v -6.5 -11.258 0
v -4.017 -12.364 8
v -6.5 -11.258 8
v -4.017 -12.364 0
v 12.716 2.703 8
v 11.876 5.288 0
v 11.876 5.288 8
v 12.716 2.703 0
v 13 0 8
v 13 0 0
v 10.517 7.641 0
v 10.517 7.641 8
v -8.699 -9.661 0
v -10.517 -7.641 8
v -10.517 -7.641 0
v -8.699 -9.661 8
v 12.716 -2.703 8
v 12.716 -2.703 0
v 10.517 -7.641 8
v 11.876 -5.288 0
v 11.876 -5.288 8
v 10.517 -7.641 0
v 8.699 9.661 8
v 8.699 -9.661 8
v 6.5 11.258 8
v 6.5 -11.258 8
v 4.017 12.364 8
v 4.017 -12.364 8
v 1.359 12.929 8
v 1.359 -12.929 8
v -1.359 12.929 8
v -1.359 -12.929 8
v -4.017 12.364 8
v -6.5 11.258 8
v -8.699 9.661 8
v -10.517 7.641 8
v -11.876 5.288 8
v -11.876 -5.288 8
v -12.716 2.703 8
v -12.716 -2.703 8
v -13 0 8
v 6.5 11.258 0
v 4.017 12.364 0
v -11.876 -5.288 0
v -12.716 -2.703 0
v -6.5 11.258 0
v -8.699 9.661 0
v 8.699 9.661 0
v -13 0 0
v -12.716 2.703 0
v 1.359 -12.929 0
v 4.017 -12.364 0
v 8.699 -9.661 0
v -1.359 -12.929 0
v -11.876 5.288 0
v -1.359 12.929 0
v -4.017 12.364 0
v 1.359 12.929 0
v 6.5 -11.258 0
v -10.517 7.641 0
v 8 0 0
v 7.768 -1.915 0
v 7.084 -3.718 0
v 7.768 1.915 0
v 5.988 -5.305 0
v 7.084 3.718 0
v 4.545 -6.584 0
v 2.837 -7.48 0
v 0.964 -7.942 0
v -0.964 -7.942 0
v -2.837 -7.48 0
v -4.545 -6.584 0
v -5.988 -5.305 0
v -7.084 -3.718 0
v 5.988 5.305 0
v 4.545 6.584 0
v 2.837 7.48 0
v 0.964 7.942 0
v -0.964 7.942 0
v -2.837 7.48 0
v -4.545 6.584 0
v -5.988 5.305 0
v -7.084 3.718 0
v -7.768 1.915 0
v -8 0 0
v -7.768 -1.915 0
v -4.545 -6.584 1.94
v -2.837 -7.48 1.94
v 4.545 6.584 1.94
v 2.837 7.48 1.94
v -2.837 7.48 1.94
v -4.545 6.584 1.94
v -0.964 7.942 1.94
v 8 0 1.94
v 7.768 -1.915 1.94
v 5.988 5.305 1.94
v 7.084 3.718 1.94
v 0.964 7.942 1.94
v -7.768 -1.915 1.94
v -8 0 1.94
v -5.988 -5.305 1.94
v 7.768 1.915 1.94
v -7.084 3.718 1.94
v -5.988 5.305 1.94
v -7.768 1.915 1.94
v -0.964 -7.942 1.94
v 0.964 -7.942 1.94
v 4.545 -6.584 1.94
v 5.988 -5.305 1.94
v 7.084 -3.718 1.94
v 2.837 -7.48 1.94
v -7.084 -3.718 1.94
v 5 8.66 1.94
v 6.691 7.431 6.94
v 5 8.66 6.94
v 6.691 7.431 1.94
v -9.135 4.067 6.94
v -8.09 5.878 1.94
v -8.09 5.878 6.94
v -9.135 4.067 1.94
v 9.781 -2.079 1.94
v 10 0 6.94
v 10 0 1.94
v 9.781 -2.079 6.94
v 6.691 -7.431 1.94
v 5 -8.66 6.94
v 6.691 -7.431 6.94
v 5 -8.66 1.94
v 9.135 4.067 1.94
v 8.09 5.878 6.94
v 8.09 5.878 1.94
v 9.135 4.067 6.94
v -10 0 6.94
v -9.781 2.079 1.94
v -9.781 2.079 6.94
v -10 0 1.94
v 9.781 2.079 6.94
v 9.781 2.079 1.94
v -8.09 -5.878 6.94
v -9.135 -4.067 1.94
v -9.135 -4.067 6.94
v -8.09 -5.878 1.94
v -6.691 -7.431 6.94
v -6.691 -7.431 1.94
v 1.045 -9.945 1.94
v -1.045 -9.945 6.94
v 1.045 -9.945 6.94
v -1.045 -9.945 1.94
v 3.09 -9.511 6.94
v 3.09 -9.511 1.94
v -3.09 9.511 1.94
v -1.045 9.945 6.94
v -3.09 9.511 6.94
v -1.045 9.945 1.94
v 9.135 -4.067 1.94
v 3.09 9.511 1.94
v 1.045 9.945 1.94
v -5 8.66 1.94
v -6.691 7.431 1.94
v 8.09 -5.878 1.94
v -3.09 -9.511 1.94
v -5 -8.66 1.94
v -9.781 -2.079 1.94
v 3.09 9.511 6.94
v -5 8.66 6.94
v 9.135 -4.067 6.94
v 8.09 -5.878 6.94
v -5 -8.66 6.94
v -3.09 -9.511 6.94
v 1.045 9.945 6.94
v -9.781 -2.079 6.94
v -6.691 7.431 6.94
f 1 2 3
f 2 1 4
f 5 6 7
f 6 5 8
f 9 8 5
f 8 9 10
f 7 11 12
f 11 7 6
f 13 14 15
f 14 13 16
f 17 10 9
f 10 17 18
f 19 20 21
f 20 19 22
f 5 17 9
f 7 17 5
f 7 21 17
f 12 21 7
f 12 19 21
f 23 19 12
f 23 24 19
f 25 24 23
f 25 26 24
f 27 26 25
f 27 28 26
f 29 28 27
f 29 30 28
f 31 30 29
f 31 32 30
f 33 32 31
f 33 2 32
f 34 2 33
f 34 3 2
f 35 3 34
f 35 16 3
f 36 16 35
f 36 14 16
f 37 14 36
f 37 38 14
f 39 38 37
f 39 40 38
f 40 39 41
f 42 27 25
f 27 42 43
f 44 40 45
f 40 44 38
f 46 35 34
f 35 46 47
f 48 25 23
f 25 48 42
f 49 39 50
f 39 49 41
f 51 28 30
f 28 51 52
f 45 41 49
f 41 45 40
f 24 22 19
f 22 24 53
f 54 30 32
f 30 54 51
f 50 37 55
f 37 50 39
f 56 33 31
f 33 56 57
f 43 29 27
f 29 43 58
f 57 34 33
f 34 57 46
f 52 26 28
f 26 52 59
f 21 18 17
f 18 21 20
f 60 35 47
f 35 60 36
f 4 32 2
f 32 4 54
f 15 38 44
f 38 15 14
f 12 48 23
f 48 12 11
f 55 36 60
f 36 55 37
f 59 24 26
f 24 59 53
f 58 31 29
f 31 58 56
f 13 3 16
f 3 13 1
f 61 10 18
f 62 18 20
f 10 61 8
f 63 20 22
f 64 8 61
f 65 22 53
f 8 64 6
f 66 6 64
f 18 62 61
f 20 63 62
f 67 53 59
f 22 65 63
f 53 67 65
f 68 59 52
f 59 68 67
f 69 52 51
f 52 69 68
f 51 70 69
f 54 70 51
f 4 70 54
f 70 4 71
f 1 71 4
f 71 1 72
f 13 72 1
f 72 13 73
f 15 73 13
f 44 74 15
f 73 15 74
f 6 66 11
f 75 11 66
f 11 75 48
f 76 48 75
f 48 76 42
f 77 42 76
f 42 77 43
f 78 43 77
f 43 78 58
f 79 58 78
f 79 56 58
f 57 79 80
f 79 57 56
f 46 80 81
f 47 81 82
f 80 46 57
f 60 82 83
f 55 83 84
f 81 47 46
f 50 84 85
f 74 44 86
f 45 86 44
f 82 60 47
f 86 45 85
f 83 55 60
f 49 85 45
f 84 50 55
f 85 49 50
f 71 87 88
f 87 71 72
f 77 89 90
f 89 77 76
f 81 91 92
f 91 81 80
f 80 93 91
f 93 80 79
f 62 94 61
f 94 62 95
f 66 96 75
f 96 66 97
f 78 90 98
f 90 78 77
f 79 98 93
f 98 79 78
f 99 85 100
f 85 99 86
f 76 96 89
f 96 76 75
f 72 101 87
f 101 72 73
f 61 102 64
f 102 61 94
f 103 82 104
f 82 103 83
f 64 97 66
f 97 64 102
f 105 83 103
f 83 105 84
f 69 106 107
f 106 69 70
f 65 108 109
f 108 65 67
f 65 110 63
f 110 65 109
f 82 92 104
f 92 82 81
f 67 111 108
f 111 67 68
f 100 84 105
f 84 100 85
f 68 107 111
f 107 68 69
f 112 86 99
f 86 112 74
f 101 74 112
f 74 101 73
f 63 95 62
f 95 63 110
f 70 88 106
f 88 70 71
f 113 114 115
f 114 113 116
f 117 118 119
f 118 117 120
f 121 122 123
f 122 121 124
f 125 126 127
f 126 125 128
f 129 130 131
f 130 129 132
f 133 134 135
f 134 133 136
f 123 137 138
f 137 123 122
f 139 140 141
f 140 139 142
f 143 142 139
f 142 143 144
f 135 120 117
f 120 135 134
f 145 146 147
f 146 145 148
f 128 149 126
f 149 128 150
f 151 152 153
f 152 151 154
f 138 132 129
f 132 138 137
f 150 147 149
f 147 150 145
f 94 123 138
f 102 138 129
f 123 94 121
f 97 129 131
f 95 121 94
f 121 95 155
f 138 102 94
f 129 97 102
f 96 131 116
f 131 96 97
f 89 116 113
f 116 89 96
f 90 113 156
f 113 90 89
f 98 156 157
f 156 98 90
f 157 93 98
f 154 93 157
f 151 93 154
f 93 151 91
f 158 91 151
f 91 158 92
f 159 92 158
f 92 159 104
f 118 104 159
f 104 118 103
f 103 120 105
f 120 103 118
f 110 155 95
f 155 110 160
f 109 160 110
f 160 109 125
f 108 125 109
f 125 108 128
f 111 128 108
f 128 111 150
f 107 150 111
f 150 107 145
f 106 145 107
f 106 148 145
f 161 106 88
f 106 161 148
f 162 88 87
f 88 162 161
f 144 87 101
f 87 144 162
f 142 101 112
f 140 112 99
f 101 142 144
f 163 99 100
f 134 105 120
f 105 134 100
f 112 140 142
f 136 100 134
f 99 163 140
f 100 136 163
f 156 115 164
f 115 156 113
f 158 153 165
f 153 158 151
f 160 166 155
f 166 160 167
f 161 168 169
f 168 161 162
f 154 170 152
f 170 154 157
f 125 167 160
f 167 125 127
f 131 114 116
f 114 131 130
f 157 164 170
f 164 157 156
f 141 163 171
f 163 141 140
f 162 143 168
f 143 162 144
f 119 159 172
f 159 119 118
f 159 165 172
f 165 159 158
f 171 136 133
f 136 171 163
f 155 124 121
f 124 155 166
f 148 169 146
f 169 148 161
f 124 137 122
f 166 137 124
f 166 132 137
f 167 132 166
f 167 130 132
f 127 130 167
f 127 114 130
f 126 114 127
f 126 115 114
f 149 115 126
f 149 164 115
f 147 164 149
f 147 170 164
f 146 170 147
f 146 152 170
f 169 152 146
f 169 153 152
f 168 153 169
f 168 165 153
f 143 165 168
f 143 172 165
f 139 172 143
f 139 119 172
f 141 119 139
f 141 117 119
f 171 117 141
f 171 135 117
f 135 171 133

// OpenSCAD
difference(){
    cylinder(h=8,r=13);
    translate([0,0,-0.05])
    cylinder(h=2,r=8);
    translate([0,0,1.94])
    cylinder(h=5,r=10);
}
